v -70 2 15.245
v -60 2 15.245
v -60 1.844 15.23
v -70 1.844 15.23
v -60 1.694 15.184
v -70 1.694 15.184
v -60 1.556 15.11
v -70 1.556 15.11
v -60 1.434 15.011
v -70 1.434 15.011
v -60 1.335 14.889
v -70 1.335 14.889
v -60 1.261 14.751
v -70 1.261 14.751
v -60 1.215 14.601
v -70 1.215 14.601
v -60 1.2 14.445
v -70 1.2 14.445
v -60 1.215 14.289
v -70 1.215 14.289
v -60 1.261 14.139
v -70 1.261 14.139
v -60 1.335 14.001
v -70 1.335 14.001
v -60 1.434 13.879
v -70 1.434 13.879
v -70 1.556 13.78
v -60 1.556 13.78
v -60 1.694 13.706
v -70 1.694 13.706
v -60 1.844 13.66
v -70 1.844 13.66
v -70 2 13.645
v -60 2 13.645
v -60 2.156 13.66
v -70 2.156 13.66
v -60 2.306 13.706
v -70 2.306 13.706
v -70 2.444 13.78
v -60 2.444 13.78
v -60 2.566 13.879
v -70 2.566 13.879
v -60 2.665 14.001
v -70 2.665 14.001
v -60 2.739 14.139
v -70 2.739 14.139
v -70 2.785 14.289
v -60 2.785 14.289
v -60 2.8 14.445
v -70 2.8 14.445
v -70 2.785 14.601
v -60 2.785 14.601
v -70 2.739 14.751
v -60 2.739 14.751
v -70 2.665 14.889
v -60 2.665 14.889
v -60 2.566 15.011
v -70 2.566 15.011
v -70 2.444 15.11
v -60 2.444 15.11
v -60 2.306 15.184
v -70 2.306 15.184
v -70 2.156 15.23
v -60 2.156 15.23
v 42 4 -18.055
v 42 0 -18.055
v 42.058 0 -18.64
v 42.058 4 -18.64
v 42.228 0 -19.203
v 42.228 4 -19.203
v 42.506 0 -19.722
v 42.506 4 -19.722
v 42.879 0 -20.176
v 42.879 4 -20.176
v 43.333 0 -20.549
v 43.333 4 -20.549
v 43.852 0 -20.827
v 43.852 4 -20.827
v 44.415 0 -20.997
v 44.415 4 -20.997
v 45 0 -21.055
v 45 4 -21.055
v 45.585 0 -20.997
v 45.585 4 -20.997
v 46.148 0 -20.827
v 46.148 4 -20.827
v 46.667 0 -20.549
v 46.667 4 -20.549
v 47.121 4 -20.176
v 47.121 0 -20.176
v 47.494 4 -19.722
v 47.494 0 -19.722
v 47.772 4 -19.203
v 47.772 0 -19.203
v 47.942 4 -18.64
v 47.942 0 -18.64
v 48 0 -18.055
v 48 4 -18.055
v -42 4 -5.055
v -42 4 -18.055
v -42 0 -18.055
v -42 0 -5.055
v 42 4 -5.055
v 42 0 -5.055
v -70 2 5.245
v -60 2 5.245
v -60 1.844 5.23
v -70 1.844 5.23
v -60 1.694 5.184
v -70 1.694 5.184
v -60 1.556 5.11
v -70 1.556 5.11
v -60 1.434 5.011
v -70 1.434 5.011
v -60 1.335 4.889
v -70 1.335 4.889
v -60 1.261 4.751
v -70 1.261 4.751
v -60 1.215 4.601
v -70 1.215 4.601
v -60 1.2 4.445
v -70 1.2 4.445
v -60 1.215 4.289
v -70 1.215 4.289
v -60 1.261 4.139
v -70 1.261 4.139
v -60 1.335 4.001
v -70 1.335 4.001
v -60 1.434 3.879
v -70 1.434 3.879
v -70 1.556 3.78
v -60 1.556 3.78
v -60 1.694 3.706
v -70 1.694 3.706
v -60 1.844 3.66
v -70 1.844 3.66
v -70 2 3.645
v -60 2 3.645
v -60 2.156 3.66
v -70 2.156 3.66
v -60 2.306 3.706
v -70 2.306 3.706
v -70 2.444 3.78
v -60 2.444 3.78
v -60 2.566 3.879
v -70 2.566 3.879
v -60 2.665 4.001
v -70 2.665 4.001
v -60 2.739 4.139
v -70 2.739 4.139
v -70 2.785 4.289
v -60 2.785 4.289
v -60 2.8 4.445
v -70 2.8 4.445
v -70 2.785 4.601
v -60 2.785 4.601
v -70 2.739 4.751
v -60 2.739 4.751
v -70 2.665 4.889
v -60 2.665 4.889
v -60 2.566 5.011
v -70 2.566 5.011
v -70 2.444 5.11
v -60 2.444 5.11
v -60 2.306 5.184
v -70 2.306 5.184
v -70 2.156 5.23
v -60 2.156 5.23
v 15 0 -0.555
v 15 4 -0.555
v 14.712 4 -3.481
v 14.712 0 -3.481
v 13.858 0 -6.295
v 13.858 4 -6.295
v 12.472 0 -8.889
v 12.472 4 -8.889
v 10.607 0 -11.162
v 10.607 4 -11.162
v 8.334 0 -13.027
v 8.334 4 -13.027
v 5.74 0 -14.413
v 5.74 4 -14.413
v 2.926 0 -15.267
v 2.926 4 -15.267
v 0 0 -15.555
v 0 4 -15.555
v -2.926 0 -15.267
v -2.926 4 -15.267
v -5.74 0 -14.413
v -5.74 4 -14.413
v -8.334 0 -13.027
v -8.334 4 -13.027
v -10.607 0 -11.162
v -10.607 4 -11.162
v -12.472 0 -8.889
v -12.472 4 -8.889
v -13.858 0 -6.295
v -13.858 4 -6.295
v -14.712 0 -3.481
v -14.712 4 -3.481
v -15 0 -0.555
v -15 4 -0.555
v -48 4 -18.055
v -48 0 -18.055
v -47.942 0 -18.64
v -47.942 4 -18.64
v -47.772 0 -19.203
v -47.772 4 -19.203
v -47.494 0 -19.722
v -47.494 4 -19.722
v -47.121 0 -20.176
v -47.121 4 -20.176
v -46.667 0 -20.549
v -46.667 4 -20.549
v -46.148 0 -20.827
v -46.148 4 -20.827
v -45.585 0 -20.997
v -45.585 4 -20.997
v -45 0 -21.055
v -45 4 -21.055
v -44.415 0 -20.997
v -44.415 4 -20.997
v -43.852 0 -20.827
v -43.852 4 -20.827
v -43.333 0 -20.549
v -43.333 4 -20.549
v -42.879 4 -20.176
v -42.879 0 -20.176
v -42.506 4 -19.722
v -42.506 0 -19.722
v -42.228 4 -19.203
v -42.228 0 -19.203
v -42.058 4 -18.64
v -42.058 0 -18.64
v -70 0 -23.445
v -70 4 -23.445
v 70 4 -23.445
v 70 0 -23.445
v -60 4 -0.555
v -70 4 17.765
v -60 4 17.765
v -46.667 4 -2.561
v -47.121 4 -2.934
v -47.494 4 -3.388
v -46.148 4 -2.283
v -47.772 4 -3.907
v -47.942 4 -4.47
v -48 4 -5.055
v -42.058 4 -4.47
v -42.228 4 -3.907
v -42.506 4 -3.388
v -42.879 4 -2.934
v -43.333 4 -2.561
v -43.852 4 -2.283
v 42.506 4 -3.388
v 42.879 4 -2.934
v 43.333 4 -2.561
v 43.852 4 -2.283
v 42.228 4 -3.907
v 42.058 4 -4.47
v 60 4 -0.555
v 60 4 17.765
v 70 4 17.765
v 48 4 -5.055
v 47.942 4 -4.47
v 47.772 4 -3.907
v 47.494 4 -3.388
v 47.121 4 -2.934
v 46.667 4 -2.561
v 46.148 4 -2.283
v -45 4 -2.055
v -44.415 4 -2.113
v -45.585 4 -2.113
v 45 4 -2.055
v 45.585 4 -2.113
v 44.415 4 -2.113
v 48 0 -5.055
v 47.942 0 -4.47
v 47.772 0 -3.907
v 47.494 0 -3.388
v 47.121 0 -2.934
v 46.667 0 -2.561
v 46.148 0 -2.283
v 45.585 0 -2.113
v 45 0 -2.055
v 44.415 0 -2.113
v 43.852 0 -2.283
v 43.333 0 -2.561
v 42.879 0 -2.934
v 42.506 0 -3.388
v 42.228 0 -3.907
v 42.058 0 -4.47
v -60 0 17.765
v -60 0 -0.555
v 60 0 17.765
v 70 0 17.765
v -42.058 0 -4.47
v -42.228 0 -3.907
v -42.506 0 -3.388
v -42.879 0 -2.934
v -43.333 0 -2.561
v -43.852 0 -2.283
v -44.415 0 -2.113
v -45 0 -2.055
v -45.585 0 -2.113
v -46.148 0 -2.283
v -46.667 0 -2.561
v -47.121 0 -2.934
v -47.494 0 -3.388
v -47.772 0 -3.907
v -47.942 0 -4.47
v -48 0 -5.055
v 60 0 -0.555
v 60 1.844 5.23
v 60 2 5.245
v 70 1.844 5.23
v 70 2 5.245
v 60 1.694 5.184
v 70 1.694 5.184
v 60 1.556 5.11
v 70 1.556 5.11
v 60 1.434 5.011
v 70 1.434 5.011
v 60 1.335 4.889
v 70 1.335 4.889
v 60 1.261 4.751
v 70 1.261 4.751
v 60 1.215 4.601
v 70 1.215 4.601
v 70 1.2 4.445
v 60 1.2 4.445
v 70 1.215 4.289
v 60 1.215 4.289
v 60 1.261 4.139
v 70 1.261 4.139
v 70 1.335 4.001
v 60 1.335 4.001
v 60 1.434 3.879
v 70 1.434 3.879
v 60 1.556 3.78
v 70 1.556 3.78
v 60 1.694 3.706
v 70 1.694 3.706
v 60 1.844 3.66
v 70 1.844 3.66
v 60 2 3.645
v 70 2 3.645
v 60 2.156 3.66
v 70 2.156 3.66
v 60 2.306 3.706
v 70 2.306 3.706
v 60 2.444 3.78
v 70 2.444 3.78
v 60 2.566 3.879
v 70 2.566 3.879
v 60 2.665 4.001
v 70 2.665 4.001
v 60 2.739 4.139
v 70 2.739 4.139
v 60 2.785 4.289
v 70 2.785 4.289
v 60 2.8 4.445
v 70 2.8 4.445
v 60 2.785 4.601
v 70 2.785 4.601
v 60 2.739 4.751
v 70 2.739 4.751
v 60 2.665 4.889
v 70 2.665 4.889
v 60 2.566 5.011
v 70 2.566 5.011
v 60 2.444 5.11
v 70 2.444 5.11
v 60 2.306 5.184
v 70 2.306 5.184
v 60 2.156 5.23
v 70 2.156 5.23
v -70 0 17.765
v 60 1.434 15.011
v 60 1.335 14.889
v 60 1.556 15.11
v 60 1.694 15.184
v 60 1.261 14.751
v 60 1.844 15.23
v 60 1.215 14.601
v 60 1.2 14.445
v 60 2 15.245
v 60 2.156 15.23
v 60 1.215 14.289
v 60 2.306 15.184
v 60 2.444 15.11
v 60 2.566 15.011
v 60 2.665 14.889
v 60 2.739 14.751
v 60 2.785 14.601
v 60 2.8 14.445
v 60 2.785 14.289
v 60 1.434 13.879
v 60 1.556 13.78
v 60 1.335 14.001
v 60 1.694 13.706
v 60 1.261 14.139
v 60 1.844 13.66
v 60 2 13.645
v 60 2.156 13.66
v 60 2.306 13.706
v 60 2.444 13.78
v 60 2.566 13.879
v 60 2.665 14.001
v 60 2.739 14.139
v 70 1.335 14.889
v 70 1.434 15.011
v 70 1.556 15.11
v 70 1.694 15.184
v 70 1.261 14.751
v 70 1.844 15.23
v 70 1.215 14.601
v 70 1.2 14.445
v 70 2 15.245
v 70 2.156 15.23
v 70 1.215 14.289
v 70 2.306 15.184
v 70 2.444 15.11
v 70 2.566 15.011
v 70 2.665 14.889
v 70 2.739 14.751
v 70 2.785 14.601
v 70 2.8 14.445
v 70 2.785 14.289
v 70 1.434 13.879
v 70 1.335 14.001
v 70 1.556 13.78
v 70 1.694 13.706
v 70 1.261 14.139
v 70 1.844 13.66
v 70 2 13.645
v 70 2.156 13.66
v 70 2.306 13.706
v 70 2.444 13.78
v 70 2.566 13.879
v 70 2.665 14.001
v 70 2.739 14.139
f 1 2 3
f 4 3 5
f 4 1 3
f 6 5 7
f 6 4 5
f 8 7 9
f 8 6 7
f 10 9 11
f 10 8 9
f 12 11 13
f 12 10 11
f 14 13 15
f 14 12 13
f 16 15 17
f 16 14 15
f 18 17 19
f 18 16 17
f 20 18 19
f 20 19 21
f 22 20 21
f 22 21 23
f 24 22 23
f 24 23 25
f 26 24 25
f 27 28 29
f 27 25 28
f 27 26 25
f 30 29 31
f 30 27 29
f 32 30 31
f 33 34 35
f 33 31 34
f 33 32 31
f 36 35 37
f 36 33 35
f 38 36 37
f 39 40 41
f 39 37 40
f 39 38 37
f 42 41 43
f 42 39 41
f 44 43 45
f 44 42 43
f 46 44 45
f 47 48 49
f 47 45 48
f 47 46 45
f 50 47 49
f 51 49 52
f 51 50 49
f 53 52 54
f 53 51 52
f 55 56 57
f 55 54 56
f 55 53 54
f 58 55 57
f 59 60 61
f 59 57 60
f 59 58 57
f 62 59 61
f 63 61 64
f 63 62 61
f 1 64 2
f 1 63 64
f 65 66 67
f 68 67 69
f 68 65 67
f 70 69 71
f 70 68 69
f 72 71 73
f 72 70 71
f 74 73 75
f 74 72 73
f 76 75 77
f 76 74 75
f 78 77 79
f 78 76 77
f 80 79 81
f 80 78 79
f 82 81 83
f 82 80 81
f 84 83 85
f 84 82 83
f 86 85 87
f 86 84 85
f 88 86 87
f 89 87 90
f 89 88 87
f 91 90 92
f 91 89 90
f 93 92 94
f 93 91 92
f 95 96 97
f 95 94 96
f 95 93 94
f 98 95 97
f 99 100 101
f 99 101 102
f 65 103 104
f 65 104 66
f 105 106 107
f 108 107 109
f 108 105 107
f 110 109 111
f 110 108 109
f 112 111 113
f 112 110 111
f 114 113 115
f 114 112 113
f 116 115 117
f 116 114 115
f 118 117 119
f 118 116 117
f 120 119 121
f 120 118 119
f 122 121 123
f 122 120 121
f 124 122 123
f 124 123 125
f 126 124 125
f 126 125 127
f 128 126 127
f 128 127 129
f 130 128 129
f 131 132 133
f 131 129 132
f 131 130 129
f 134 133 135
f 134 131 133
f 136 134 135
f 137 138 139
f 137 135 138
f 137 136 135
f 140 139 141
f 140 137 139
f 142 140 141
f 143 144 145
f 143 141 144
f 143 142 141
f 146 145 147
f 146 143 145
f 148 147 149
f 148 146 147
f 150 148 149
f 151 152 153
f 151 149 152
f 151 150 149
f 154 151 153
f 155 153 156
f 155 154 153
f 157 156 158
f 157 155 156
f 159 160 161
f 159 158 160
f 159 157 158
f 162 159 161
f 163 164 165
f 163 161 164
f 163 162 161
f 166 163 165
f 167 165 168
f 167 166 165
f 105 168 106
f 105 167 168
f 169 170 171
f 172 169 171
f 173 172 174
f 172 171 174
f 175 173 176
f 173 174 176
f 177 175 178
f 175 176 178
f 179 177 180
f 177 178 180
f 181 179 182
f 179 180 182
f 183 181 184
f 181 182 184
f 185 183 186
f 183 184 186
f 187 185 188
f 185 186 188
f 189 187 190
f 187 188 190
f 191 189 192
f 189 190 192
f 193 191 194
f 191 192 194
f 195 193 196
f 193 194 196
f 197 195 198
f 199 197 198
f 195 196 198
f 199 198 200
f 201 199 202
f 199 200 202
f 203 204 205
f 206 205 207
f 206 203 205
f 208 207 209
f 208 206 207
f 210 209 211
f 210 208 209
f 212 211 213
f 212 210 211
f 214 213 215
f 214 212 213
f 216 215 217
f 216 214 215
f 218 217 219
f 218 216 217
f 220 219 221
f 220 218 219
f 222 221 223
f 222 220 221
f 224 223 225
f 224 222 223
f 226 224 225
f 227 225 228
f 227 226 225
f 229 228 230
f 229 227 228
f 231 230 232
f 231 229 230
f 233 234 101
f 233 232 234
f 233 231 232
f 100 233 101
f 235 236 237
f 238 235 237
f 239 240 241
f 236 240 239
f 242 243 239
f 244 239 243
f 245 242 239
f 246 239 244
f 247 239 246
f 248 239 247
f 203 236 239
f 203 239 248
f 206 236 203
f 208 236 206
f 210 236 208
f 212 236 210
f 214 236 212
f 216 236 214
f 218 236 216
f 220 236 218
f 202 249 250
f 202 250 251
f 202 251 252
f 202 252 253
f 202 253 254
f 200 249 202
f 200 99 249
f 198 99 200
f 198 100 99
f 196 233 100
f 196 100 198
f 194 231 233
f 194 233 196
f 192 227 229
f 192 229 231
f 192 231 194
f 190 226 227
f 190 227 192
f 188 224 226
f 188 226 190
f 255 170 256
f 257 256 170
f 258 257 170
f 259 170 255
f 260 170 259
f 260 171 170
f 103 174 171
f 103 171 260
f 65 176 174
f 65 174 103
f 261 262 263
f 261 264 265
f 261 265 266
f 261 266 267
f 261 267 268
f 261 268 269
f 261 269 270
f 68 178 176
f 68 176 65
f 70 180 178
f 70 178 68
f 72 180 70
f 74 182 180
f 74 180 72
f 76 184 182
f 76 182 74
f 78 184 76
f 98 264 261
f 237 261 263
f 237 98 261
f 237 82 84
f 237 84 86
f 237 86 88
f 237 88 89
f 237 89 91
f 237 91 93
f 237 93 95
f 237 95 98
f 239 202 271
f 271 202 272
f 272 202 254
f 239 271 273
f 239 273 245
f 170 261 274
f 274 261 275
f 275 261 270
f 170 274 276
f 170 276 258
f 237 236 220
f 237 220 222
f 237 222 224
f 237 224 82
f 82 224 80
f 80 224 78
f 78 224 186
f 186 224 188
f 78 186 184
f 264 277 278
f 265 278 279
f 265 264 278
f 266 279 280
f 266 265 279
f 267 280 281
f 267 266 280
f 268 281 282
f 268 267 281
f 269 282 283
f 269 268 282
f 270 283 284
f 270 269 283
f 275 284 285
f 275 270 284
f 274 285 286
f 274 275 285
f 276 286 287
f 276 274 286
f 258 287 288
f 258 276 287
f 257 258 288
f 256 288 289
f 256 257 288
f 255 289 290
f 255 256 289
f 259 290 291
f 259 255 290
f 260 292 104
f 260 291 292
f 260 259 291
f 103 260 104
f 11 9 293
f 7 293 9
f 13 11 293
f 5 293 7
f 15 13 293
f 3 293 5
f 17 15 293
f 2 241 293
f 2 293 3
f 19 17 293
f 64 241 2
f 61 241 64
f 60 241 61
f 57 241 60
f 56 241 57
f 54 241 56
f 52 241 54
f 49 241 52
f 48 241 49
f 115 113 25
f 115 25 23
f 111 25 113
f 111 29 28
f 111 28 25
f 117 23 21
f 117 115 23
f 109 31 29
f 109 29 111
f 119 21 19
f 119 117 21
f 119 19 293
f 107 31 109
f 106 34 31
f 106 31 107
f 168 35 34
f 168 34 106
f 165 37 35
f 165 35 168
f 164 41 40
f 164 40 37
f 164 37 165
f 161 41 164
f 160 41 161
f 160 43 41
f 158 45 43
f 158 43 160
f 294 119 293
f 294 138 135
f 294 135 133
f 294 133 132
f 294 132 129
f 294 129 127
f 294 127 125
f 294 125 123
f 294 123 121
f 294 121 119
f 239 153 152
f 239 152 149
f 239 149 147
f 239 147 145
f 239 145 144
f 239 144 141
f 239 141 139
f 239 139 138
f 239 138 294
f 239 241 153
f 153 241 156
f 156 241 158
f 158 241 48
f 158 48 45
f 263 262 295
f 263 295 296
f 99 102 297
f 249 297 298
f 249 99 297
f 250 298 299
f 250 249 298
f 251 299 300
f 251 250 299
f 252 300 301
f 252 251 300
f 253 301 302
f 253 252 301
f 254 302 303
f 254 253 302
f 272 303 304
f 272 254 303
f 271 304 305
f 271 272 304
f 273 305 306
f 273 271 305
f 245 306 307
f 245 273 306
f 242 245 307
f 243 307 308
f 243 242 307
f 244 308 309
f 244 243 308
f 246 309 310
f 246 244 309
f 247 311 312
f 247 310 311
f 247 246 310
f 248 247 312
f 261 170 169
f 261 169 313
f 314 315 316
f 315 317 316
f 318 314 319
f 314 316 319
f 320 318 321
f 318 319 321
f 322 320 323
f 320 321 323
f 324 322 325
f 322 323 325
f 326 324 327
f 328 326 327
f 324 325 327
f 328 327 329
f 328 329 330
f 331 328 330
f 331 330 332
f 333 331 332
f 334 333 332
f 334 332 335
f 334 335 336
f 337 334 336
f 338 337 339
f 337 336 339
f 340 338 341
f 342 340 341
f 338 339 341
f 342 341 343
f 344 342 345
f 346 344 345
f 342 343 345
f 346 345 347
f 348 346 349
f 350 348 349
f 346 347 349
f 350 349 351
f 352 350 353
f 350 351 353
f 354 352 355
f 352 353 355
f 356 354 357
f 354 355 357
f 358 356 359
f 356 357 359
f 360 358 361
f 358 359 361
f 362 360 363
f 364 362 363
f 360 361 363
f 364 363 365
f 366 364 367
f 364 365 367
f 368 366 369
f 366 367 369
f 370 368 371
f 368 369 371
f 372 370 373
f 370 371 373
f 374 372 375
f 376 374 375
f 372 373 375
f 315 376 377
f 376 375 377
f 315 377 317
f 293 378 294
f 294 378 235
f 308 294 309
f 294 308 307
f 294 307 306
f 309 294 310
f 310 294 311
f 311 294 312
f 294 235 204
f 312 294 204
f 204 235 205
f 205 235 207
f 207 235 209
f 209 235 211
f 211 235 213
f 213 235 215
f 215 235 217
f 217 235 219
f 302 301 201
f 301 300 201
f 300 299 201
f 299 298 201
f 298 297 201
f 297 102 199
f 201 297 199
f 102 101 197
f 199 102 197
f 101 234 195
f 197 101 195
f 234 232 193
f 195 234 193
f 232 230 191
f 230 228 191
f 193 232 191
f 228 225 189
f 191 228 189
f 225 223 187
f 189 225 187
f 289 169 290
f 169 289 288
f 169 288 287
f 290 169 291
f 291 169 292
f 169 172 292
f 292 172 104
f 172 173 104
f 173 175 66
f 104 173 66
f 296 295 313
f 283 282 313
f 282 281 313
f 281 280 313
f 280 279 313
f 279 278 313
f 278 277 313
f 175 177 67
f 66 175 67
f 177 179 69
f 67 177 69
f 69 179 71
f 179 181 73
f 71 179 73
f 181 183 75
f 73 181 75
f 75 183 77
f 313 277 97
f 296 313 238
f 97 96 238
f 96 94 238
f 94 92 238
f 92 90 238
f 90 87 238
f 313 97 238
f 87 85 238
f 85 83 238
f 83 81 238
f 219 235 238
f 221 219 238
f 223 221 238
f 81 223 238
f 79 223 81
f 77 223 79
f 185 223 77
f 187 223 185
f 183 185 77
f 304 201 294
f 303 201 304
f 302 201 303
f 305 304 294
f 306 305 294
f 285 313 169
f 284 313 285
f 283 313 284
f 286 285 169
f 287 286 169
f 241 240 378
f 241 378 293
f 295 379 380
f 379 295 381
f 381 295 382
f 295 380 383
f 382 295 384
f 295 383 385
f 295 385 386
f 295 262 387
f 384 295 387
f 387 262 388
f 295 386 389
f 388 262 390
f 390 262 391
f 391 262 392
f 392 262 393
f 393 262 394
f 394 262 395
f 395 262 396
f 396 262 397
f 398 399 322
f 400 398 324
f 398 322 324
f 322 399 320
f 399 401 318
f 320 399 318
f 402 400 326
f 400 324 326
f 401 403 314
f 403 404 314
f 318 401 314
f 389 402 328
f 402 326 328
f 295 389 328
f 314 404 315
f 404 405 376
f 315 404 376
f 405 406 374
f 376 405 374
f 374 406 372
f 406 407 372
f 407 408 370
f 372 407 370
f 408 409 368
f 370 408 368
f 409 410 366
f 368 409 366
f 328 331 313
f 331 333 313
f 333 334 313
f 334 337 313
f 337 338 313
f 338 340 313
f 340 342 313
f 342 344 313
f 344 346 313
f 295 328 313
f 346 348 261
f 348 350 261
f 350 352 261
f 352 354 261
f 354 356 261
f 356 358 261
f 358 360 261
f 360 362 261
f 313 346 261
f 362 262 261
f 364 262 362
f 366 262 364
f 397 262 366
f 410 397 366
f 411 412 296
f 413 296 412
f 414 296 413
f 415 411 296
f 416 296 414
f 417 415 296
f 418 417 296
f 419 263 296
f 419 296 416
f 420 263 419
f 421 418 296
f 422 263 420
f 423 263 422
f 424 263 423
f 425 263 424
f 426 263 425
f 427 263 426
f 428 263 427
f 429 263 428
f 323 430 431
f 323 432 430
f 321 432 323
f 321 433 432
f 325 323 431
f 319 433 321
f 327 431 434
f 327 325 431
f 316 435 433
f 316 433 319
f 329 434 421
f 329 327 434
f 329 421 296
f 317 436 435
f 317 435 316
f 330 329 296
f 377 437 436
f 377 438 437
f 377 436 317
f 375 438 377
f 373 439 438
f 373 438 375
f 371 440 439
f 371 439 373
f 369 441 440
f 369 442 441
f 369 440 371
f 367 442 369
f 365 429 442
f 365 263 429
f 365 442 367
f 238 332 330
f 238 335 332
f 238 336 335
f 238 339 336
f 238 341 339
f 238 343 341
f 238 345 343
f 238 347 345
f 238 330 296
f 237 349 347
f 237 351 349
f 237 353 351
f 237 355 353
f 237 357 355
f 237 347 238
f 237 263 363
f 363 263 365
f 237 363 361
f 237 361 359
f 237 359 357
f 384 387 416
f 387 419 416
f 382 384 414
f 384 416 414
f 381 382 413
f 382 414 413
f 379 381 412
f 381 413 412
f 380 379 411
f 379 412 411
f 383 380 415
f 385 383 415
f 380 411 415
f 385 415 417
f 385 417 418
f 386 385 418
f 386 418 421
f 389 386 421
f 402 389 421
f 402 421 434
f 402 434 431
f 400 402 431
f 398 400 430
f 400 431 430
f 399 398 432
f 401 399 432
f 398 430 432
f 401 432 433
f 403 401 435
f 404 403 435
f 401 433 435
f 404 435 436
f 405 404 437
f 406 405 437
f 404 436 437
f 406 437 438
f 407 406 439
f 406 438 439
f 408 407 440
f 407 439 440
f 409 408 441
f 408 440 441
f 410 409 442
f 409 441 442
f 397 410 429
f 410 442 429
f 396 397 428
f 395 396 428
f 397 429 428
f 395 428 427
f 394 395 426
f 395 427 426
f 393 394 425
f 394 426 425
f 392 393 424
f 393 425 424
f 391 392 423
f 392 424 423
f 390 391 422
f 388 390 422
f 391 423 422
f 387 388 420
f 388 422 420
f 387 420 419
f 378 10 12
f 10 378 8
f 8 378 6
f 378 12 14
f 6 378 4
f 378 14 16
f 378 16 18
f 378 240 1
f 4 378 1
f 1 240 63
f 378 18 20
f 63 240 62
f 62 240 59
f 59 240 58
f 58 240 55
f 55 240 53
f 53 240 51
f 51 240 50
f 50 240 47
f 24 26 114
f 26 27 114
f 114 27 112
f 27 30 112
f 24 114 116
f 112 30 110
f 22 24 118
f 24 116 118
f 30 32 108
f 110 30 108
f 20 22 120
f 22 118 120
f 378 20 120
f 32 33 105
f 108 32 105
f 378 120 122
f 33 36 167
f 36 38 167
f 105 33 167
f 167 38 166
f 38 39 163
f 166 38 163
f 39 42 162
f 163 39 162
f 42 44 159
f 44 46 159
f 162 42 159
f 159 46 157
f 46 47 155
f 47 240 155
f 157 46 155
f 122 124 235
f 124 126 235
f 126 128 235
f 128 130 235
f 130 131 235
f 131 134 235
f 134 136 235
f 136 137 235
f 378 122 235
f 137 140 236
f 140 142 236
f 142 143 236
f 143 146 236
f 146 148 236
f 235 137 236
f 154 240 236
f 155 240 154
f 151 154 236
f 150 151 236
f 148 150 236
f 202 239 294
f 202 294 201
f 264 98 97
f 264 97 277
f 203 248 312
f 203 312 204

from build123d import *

# Parameters (mm, degrees)
SKETCH2_W                      = 140
SKETCH2_H                      = 38.89
BOSS_EXTRUDE1_DEPTH            = 4
M2X0_4_TAPPED_HOLE1_AT_2_COUNT = 2
M2X0_4_TAPPED_HOLE1_AT_2_PITCH = 10
SKETCH6_W                      = 120
SKETCH6_H                      = 20
CUT_EXTRUDE1_DEPTH             = 5
SKETCH8_W                      = 35
SKETCH8_H                      = 2.29
SKETCH8_W_2                    = 10
BOSS_EXTRUDE2_DEPTH            = 4
SKETCH9_W                      = 25
SKETCH9_H                      = 2.29
CUT_EXTRUDE3_DEPTH             = 5
SKETCH10_W                     = 140
SKETCH10_H                     = 4
BOSS_EXTRUDE3_DEPTH            = 4
SKETCH11_W                     = 140
SKETCH11_H                     = 3.97
CUT_EXTRUDE4_DEPTH             = 10
CUT_EXTRUDE5_DEPTH             = 5
CUT_EXTRUDE6_DEPTH             = 10


with BuildPart() as part:
    # Sketch2 → Boss-Extrude1 (new body)
    with BuildSketch(Plane(origin=(0, 0, 0), x_dir=(1, 0, 0), z_dir=(0, 1, 0))):
        Rectangle(SKETCH2_W, SKETCH2_H)
    extrude(amount=BOSS_EXTRUDE1_DEPTH)

    # Sketch4 → M2x0.4 Tapped Hole1 (revolve, cut)
    with BuildSketch(Plane(origin=(-70, 2, 4.445), x_dir=(0, 0, 1), z_dir=(0, 1, 0))):
        Polygon((0, 0), (0, 18.480688495), (0.8, 18), (0.8, 0), align=None)
    m2x0_4_tapped_hole1 = revolve(axis=Axis((-76.35, 2, 4.445), (1, 0, 0)), mode=Mode.SUBTRACT)

    # M2x0.4 Tapped Hole1 at 2: M2x0.4 Tapped Hole1 ×2
    with Locations(*[(0, 0, i * M2X0_4_TAPPED_HOLE1_AT_2_PITCH) for i in range(1, M2X0_4_TAPPED_HOLE1_AT_2_COUNT)]):
        add(m2x0_4_tapped_hole1, mode=Mode.SUBTRACT)

    # Mirror1: M2x0.4 Tapped Hole1 across plane
    add(m2x0_4_tapped_hole1.mirror(Plane(origin=(0, 0, 0), x_dir=(0, 0, 1), z_dir=(1, 0, 0))), mode=Mode.SUBTRACT)

    # Mirror1 copy 1 sketch → Mirror1 copy 1 (revolve, cut)
    with BuildSketch(Plane(origin=(70, 2, 14.445), x_dir=(0, 0, 1), z_dir=(0, 1, 0))):
        Polygon((0, 0), (0, -18.480688495), (0.8, -18), (0.8, 0), align=None)
    revolve(axis=Axis((76.35, 2, 14.445), (1, 0, 0)), mode=Mode.SUBTRACT)

    # Sketch6 → Cut-Extrude1 (cut, through all)
    with BuildSketch(Plane(origin=(0, 4, 0), x_dir=(1, 0, 0), z_dir=(0, 1, 0))):
        with Locations((0, -9.445)):
            Rectangle(SKETCH6_W, SKETCH6_H)
    extrude(amount=-CUT_EXTRUDE1_DEPTH, mode=Mode.SUBTRACT)

    # Sketch8 → Boss-Extrude2 (add, through all)
    with BuildSketch(Plane(origin=(0, 4, 0), x_dir=(1, 0, 0), z_dir=(0, 1, 0))):
        with Locations((-52.5, -20.59)):
            Rectangle(SKETCH8_W, SKETCH8_H)
        with Locations((65, -20.59)):
            Rectangle(SKETCH8_W_2, SKETCH8_H)
    extrude(amount=-BOSS_EXTRUDE2_DEPTH)

    # Sketch9 → Cut-Extrude3 (cut, through all)
    with BuildSketch(Plane(origin=(0, 4, 0), x_dir=(1, 0, 0), z_dir=(0, 1, 0))):
        with Locations((-47.5, -20.59)):
            Rectangle(SKETCH9_W, SKETCH9_H)
    extrude(amount=-CUT_EXTRUDE3_DEPTH, mode=Mode.SUBTRACT)

    # Sketch10 → Boss-Extrude3 (add, through all)
    with BuildSketch(Plane(origin=(0, 4, 0), x_dir=(1, 0, 0), z_dir=(0, 1, 0))):
        with Locations((0, 21.445)):
            Rectangle(SKETCH10_W, SKETCH10_H)
    extrude(amount=-BOSS_EXTRUDE3_DEPTH)

    # Sketch11 → Cut-Extrude4 (cut)
    with BuildSketch(Plane(origin=(0, 4, 0), x_dir=(1, 0, 0), z_dir=(0, 1, 0))):
        with Locations((0, -19.75)):
            Rectangle(SKETCH11_W, SKETCH11_H)
    extrude(amount=-CUT_EXTRUDE4_DEPTH, mode=Mode.SUBTRACT)

    # Sketch7 → Cut-Extrude5 (cut, through all)
    with BuildSketch(Plane(origin=(0, 4, 0), x_dir=(1, 0, 0), z_dir=(0, 1, 0))):
        with BuildLine():
            Line((-42, 18.055), (-42, 5.055))
            ThreePointArc((-42, 5.055), (-45, 2.055), (-48, 5.055))
            Line((-48, 5.055), (-48, 18.055))
            ThreePointArc((-48, 18.055), (-45, 21.055), (-42, 18.055))
        make_face()
        with BuildLine():
            Line((48, 18.055), (48, 5.055))
            ThreePointArc((48, 5.055), (45, 2.055), (42, 5.055))
            Line((42, 5.055), (42, 18.055))
            ThreePointArc((42, 18.055), (45, 21.055), (48, 18.055))
        make_face()
    extrude(amount=-CUT_EXTRUDE5_DEPTH, mode=Mode.SUBTRACT)

    # Sketch13 → Cut-Extrude6 (cut)
    with BuildSketch(Plane(origin=(0, 4, 0), x_dir=(1, 0, 0), z_dir=(0, 1, 0))):
        with BuildLine():
            Line((-15, 0.555), (15, 0.555))
            ThreePointArc((15, 0.555), (0, 15.555), (-15, 0.555))
        make_face()
    extrude(amount=-CUT_EXTRUDE6_DEPTH, mode=Mode.SUBTRACT)


solid = part.part
